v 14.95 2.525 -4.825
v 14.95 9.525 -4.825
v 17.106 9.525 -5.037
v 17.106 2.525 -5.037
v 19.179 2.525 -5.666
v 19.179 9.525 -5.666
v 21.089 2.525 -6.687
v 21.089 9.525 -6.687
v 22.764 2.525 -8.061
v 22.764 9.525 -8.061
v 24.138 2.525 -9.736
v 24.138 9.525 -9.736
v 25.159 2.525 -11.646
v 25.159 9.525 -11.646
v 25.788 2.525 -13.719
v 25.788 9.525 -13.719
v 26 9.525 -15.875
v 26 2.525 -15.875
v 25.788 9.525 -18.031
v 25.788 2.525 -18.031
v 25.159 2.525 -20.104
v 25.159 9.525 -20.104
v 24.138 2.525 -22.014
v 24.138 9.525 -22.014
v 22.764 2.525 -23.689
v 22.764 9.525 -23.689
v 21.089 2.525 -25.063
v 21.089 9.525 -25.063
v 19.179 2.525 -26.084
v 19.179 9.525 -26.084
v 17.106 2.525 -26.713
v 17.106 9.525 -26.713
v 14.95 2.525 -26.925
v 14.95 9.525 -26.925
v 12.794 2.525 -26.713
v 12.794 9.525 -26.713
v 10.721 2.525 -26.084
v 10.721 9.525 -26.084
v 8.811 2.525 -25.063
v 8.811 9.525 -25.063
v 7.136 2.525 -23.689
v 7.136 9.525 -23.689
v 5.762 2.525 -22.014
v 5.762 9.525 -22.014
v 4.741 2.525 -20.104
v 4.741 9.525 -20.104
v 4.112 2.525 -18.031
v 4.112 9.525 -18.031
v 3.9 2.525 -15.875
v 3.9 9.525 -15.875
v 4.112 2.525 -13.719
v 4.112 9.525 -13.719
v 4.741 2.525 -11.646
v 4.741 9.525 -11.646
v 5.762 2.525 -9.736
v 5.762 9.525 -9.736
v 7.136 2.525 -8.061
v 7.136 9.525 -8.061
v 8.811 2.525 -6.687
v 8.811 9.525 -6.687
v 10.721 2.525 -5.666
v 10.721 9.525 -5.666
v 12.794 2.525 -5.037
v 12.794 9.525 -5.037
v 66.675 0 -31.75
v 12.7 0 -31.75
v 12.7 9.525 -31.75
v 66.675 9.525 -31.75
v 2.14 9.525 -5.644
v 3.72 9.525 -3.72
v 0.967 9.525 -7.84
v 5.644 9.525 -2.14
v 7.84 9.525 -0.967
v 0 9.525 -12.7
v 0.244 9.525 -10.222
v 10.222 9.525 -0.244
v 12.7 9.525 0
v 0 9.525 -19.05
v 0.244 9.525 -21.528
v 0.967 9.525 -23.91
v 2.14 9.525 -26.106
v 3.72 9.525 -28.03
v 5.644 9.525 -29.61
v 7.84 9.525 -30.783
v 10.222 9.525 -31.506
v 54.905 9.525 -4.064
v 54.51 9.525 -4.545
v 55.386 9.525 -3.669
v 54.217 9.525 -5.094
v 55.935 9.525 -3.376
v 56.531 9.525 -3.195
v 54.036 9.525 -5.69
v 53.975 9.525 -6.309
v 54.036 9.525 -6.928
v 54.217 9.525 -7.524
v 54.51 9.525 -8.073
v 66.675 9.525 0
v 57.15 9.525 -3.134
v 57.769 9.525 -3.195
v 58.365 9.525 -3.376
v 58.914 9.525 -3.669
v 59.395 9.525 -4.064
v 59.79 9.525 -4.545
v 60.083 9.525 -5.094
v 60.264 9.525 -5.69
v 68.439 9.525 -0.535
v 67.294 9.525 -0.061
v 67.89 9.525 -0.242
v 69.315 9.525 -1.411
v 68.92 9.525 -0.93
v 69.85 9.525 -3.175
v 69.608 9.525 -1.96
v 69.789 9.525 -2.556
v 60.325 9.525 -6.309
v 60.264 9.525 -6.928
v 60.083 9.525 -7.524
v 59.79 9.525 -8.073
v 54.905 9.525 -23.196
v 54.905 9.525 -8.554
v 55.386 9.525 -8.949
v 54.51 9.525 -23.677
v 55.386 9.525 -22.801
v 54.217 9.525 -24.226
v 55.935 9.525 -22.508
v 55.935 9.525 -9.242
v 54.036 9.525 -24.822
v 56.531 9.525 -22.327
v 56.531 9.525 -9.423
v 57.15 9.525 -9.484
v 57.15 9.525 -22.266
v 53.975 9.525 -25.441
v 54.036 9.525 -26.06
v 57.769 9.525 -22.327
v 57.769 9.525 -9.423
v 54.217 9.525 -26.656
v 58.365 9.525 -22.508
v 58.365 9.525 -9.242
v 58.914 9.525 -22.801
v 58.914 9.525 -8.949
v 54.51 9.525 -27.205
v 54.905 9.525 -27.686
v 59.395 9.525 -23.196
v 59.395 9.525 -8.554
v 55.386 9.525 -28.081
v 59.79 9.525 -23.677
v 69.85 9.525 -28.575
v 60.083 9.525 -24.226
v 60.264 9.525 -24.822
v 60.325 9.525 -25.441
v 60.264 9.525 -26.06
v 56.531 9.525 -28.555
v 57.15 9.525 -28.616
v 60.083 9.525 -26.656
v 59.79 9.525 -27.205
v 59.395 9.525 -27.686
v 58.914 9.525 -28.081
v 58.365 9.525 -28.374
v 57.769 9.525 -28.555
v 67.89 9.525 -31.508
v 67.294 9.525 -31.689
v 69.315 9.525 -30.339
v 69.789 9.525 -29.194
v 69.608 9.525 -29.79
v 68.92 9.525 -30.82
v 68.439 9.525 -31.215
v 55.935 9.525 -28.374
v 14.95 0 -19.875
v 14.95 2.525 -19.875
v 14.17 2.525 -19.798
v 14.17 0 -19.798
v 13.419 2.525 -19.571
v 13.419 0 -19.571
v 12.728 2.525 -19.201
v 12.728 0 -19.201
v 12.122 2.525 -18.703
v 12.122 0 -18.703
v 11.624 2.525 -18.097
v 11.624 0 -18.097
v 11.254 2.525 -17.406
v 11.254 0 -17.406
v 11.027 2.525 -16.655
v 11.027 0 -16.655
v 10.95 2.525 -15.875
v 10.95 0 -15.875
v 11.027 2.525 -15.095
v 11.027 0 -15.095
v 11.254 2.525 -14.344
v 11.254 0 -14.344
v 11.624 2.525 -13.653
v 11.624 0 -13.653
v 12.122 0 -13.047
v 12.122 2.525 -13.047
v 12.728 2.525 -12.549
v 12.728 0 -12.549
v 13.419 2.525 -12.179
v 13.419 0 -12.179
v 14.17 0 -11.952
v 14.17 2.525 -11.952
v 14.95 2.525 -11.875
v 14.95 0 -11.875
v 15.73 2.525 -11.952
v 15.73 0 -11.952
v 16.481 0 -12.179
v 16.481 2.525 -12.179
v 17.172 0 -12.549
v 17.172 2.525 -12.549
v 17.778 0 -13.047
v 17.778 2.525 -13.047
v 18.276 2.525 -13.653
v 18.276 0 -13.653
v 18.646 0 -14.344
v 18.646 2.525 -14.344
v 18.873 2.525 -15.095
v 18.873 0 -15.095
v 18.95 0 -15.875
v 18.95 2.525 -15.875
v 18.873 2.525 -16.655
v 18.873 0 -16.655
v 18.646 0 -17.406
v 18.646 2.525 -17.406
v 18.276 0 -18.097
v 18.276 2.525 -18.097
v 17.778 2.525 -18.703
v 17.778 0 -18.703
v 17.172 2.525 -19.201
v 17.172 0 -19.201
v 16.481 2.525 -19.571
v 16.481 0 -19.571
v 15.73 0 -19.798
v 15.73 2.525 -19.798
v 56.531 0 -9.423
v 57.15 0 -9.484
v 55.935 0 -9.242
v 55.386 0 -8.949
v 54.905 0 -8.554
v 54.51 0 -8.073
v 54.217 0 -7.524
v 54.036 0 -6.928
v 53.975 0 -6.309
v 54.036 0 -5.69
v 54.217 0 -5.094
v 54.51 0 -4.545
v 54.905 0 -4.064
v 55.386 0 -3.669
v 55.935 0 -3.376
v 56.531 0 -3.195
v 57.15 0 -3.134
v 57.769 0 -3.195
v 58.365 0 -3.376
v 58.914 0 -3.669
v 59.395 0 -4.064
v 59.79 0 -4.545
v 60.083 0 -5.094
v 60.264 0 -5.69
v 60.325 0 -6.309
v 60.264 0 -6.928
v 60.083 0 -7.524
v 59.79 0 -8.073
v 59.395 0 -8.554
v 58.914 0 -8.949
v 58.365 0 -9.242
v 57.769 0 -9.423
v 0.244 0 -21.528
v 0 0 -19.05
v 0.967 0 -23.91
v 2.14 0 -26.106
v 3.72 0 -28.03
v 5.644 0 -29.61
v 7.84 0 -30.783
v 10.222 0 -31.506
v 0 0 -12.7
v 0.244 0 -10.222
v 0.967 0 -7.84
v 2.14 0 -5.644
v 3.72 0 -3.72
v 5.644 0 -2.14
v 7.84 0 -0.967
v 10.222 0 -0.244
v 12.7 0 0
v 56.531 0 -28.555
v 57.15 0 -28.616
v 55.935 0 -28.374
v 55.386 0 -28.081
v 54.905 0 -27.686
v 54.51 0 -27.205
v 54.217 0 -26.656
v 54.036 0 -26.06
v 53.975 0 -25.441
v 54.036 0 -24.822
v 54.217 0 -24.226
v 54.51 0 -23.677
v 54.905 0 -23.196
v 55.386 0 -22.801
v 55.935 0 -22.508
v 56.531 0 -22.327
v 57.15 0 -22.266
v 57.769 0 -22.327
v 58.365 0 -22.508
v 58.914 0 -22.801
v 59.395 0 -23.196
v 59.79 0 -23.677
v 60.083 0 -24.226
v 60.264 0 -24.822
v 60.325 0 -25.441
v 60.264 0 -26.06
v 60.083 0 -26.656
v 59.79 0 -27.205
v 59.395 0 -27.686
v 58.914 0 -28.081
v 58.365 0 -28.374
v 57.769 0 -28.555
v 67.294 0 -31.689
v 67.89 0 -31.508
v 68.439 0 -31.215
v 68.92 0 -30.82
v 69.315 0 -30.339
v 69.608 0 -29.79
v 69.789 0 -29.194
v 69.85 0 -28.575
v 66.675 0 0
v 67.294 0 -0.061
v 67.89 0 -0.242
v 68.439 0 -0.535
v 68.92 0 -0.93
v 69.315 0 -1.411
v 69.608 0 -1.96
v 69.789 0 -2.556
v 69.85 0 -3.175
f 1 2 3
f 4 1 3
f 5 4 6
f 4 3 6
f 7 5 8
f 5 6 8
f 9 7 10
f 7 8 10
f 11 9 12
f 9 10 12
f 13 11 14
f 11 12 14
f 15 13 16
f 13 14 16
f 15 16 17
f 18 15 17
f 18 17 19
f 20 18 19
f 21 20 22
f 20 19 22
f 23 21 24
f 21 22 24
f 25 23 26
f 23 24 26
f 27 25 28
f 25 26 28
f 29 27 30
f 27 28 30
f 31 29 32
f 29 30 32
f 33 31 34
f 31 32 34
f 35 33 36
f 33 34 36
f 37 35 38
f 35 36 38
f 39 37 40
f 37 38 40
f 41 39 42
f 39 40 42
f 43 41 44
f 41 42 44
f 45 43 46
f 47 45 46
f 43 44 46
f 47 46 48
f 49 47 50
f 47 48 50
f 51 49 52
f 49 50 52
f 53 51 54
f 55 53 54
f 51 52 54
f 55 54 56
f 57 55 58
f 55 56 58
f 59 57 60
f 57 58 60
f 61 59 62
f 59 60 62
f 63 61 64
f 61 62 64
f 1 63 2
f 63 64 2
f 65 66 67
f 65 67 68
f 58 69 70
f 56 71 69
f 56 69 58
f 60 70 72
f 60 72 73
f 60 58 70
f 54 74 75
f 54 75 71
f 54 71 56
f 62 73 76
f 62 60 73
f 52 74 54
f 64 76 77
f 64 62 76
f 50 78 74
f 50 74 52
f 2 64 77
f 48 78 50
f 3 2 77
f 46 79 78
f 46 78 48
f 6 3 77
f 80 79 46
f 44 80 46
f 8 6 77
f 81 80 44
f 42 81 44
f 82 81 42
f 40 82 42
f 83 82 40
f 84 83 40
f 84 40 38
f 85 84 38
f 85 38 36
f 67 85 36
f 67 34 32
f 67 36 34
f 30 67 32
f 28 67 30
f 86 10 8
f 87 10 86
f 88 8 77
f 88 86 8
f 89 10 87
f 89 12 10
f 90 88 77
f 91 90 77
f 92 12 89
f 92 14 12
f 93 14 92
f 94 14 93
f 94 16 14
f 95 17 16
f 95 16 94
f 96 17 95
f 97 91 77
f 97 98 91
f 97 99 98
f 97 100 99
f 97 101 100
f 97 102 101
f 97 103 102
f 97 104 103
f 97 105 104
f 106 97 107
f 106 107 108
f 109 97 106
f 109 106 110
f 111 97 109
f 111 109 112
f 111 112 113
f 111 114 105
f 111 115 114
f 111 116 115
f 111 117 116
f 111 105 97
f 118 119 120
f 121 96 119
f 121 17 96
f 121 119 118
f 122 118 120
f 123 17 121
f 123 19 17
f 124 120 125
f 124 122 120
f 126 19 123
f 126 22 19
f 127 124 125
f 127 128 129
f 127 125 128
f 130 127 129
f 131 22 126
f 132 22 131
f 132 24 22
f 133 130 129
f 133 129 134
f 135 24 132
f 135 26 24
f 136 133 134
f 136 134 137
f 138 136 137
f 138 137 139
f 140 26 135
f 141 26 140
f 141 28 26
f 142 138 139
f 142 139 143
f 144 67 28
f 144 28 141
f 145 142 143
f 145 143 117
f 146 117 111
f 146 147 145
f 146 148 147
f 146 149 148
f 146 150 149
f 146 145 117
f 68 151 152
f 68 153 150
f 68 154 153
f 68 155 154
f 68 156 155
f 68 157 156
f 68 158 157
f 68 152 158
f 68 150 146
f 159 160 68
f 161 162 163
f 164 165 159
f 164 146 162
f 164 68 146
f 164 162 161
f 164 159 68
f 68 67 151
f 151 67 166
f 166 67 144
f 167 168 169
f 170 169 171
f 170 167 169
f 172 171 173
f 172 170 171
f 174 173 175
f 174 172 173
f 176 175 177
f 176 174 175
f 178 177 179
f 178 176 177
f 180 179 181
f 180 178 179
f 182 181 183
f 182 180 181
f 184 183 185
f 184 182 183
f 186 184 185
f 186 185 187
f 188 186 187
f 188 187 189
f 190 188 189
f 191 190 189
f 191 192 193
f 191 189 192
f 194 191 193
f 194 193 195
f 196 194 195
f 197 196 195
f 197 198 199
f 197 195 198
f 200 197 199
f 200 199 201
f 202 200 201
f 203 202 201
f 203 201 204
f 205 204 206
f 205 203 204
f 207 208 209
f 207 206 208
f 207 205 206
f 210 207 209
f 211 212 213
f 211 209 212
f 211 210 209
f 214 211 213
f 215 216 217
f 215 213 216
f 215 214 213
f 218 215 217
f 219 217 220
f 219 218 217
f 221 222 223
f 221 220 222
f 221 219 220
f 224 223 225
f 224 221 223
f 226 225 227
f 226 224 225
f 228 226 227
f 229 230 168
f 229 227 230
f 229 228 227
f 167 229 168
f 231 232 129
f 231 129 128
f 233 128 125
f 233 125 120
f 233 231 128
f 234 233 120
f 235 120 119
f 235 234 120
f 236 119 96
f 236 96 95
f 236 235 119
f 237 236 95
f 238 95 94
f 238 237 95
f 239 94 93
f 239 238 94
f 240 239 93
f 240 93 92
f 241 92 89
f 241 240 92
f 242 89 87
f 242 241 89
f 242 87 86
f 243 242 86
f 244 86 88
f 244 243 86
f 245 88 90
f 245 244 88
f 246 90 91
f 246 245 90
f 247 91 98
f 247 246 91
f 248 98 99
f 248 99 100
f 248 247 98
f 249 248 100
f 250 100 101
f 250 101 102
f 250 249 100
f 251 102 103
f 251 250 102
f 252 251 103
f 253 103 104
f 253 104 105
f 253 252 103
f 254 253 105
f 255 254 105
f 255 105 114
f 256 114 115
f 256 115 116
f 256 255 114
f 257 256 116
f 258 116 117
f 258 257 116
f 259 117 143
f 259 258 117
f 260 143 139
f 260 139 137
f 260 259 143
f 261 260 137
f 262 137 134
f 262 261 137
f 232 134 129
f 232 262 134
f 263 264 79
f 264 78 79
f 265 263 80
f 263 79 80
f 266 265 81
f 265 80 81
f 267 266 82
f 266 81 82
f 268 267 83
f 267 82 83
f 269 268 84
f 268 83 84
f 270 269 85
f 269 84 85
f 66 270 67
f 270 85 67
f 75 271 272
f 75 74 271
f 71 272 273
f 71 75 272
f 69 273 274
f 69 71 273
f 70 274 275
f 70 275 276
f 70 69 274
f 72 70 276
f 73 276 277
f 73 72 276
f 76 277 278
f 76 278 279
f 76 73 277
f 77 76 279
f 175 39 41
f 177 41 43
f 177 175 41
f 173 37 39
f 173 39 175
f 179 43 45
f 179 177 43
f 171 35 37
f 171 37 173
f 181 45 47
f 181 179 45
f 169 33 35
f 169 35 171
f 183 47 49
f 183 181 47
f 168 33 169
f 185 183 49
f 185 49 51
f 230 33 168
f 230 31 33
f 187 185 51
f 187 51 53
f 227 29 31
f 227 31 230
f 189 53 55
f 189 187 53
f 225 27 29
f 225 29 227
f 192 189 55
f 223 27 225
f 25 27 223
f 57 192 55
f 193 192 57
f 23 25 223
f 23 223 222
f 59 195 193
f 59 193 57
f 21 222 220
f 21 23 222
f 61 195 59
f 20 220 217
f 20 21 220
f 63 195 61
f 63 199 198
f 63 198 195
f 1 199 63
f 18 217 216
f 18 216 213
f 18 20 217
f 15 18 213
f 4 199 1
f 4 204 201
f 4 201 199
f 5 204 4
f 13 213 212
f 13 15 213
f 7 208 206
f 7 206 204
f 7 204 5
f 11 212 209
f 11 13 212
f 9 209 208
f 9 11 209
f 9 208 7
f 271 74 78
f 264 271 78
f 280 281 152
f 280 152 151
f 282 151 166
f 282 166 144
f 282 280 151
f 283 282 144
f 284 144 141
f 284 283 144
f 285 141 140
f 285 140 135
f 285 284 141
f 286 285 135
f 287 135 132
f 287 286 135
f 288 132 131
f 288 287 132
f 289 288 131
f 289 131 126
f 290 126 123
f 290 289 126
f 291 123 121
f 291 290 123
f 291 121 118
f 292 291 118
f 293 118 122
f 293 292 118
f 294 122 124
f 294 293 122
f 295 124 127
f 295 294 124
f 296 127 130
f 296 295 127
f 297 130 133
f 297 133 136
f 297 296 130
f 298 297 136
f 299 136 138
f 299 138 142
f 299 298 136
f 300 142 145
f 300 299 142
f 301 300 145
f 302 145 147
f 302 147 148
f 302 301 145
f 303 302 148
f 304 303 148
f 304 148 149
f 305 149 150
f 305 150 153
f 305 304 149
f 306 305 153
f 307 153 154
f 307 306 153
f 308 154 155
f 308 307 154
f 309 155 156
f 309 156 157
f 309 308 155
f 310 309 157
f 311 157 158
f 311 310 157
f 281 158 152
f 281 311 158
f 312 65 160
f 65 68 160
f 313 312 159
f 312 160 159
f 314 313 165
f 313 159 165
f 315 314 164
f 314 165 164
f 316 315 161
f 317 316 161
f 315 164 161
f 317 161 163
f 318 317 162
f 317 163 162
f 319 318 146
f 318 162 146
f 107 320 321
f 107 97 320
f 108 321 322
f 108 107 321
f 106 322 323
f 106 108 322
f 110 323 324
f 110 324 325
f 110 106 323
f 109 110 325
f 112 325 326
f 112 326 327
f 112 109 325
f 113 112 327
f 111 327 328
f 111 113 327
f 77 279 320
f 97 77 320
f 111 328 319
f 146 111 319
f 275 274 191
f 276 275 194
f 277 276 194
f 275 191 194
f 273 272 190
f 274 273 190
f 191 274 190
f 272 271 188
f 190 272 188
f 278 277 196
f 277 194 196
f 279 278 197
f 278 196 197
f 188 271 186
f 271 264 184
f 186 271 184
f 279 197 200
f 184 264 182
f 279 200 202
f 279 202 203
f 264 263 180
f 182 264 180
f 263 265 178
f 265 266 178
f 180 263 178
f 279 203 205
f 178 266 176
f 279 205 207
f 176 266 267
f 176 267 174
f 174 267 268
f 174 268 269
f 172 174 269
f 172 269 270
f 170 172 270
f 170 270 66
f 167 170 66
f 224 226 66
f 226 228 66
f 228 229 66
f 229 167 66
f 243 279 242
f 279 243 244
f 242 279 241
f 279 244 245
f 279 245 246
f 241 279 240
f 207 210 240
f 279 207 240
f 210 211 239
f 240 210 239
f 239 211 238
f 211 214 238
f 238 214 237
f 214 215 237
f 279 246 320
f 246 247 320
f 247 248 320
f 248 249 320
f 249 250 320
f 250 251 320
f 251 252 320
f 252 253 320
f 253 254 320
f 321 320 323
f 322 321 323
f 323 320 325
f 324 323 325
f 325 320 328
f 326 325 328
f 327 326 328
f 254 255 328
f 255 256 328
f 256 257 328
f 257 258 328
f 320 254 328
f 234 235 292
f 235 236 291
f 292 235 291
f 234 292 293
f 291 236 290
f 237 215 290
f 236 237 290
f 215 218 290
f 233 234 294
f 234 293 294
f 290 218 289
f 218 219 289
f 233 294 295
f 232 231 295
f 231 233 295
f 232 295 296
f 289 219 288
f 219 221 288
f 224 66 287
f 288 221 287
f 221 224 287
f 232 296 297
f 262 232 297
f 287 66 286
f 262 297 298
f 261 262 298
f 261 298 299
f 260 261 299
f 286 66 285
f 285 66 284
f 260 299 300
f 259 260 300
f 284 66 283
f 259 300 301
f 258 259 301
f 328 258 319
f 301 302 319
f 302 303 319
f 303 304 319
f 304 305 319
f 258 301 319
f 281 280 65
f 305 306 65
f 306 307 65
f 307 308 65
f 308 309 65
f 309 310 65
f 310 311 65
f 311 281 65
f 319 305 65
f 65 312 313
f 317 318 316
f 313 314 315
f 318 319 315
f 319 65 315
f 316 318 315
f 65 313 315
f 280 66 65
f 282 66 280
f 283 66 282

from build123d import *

# Parameters (mm, degrees)
SKETCH1_W           = 69.85
SKETCH1_H           = 31.75
SKETCH1_R           = 4
SKETCH1_R_2         = 3.175
BOSS_EXTRUDE1_DEPTH = 9.525
SKETCH2_R           = 11.05
CUT_EXTRUDE1_DEPTH  = 7
FILLET2_R           = 12.7
FILLET3_R           = 3.175


with BuildPart() as part:
    # Sketch1 → Boss-Extrude1 (new body)
    with BuildSketch(Plane(origin=(0, 0, 0), x_dir=(1, 0, 0), z_dir=(0, 1, 0))):
        with Locations((34.925, 15.875)):
            Rectangle(SKETCH1_W, SKETCH1_H)
        with Locations(Location((14.950000072, 15.875, 0), (0, 0, 90))):
            Circle(SKETCH1_R, mode=Mode.SUBTRACT)
        with Locations(Location((57.15, 25.441087639, 0), (0, 0, 90))):
            Circle(SKETCH1_R_2, mode=Mode.SUBTRACT)
        with Locations(Location((57.15, 6.308912361, 0), (0, 0, 90))):
            Circle(SKETCH1_R_2, mode=Mode.SUBTRACT)
    extrude(amount=BOSS_EXTRUDE1_DEPTH)

    # Sketch2 → Cut-Extrude1 (cut)
    with BuildSketch(Plane(origin=(0, 9.525, 0), x_dir=(1, 0, 0), z_dir=(0, 1, 0))):
        with Locations(Location((14.950000072, 15.875, 0), (0, 0, 270))):
            Circle(SKETCH2_R)
    extrude(amount=-CUT_EXTRUDE1_DEPTH, mode=Mode.SUBTRACT)

    # Fillet2
    fillet2_edges = [part.edges().sort_by_distance(p)[0] for p in [
        (0, 4.7625, -31.75),
        (0, 4.7625, 0),
    ]]
    fillet(fillet2_edges, radius=FILLET2_R)

    # Fillet3
    fillet3_edges = [part.edges().sort_by_distance(p)[0] for p in [
        (69.85, 4.7625, -31.75),
        (69.85, 4.7625, 0),
    ]]
    fillet(fillet3_edges, radius=FILLET3_R)


solid = part.part
